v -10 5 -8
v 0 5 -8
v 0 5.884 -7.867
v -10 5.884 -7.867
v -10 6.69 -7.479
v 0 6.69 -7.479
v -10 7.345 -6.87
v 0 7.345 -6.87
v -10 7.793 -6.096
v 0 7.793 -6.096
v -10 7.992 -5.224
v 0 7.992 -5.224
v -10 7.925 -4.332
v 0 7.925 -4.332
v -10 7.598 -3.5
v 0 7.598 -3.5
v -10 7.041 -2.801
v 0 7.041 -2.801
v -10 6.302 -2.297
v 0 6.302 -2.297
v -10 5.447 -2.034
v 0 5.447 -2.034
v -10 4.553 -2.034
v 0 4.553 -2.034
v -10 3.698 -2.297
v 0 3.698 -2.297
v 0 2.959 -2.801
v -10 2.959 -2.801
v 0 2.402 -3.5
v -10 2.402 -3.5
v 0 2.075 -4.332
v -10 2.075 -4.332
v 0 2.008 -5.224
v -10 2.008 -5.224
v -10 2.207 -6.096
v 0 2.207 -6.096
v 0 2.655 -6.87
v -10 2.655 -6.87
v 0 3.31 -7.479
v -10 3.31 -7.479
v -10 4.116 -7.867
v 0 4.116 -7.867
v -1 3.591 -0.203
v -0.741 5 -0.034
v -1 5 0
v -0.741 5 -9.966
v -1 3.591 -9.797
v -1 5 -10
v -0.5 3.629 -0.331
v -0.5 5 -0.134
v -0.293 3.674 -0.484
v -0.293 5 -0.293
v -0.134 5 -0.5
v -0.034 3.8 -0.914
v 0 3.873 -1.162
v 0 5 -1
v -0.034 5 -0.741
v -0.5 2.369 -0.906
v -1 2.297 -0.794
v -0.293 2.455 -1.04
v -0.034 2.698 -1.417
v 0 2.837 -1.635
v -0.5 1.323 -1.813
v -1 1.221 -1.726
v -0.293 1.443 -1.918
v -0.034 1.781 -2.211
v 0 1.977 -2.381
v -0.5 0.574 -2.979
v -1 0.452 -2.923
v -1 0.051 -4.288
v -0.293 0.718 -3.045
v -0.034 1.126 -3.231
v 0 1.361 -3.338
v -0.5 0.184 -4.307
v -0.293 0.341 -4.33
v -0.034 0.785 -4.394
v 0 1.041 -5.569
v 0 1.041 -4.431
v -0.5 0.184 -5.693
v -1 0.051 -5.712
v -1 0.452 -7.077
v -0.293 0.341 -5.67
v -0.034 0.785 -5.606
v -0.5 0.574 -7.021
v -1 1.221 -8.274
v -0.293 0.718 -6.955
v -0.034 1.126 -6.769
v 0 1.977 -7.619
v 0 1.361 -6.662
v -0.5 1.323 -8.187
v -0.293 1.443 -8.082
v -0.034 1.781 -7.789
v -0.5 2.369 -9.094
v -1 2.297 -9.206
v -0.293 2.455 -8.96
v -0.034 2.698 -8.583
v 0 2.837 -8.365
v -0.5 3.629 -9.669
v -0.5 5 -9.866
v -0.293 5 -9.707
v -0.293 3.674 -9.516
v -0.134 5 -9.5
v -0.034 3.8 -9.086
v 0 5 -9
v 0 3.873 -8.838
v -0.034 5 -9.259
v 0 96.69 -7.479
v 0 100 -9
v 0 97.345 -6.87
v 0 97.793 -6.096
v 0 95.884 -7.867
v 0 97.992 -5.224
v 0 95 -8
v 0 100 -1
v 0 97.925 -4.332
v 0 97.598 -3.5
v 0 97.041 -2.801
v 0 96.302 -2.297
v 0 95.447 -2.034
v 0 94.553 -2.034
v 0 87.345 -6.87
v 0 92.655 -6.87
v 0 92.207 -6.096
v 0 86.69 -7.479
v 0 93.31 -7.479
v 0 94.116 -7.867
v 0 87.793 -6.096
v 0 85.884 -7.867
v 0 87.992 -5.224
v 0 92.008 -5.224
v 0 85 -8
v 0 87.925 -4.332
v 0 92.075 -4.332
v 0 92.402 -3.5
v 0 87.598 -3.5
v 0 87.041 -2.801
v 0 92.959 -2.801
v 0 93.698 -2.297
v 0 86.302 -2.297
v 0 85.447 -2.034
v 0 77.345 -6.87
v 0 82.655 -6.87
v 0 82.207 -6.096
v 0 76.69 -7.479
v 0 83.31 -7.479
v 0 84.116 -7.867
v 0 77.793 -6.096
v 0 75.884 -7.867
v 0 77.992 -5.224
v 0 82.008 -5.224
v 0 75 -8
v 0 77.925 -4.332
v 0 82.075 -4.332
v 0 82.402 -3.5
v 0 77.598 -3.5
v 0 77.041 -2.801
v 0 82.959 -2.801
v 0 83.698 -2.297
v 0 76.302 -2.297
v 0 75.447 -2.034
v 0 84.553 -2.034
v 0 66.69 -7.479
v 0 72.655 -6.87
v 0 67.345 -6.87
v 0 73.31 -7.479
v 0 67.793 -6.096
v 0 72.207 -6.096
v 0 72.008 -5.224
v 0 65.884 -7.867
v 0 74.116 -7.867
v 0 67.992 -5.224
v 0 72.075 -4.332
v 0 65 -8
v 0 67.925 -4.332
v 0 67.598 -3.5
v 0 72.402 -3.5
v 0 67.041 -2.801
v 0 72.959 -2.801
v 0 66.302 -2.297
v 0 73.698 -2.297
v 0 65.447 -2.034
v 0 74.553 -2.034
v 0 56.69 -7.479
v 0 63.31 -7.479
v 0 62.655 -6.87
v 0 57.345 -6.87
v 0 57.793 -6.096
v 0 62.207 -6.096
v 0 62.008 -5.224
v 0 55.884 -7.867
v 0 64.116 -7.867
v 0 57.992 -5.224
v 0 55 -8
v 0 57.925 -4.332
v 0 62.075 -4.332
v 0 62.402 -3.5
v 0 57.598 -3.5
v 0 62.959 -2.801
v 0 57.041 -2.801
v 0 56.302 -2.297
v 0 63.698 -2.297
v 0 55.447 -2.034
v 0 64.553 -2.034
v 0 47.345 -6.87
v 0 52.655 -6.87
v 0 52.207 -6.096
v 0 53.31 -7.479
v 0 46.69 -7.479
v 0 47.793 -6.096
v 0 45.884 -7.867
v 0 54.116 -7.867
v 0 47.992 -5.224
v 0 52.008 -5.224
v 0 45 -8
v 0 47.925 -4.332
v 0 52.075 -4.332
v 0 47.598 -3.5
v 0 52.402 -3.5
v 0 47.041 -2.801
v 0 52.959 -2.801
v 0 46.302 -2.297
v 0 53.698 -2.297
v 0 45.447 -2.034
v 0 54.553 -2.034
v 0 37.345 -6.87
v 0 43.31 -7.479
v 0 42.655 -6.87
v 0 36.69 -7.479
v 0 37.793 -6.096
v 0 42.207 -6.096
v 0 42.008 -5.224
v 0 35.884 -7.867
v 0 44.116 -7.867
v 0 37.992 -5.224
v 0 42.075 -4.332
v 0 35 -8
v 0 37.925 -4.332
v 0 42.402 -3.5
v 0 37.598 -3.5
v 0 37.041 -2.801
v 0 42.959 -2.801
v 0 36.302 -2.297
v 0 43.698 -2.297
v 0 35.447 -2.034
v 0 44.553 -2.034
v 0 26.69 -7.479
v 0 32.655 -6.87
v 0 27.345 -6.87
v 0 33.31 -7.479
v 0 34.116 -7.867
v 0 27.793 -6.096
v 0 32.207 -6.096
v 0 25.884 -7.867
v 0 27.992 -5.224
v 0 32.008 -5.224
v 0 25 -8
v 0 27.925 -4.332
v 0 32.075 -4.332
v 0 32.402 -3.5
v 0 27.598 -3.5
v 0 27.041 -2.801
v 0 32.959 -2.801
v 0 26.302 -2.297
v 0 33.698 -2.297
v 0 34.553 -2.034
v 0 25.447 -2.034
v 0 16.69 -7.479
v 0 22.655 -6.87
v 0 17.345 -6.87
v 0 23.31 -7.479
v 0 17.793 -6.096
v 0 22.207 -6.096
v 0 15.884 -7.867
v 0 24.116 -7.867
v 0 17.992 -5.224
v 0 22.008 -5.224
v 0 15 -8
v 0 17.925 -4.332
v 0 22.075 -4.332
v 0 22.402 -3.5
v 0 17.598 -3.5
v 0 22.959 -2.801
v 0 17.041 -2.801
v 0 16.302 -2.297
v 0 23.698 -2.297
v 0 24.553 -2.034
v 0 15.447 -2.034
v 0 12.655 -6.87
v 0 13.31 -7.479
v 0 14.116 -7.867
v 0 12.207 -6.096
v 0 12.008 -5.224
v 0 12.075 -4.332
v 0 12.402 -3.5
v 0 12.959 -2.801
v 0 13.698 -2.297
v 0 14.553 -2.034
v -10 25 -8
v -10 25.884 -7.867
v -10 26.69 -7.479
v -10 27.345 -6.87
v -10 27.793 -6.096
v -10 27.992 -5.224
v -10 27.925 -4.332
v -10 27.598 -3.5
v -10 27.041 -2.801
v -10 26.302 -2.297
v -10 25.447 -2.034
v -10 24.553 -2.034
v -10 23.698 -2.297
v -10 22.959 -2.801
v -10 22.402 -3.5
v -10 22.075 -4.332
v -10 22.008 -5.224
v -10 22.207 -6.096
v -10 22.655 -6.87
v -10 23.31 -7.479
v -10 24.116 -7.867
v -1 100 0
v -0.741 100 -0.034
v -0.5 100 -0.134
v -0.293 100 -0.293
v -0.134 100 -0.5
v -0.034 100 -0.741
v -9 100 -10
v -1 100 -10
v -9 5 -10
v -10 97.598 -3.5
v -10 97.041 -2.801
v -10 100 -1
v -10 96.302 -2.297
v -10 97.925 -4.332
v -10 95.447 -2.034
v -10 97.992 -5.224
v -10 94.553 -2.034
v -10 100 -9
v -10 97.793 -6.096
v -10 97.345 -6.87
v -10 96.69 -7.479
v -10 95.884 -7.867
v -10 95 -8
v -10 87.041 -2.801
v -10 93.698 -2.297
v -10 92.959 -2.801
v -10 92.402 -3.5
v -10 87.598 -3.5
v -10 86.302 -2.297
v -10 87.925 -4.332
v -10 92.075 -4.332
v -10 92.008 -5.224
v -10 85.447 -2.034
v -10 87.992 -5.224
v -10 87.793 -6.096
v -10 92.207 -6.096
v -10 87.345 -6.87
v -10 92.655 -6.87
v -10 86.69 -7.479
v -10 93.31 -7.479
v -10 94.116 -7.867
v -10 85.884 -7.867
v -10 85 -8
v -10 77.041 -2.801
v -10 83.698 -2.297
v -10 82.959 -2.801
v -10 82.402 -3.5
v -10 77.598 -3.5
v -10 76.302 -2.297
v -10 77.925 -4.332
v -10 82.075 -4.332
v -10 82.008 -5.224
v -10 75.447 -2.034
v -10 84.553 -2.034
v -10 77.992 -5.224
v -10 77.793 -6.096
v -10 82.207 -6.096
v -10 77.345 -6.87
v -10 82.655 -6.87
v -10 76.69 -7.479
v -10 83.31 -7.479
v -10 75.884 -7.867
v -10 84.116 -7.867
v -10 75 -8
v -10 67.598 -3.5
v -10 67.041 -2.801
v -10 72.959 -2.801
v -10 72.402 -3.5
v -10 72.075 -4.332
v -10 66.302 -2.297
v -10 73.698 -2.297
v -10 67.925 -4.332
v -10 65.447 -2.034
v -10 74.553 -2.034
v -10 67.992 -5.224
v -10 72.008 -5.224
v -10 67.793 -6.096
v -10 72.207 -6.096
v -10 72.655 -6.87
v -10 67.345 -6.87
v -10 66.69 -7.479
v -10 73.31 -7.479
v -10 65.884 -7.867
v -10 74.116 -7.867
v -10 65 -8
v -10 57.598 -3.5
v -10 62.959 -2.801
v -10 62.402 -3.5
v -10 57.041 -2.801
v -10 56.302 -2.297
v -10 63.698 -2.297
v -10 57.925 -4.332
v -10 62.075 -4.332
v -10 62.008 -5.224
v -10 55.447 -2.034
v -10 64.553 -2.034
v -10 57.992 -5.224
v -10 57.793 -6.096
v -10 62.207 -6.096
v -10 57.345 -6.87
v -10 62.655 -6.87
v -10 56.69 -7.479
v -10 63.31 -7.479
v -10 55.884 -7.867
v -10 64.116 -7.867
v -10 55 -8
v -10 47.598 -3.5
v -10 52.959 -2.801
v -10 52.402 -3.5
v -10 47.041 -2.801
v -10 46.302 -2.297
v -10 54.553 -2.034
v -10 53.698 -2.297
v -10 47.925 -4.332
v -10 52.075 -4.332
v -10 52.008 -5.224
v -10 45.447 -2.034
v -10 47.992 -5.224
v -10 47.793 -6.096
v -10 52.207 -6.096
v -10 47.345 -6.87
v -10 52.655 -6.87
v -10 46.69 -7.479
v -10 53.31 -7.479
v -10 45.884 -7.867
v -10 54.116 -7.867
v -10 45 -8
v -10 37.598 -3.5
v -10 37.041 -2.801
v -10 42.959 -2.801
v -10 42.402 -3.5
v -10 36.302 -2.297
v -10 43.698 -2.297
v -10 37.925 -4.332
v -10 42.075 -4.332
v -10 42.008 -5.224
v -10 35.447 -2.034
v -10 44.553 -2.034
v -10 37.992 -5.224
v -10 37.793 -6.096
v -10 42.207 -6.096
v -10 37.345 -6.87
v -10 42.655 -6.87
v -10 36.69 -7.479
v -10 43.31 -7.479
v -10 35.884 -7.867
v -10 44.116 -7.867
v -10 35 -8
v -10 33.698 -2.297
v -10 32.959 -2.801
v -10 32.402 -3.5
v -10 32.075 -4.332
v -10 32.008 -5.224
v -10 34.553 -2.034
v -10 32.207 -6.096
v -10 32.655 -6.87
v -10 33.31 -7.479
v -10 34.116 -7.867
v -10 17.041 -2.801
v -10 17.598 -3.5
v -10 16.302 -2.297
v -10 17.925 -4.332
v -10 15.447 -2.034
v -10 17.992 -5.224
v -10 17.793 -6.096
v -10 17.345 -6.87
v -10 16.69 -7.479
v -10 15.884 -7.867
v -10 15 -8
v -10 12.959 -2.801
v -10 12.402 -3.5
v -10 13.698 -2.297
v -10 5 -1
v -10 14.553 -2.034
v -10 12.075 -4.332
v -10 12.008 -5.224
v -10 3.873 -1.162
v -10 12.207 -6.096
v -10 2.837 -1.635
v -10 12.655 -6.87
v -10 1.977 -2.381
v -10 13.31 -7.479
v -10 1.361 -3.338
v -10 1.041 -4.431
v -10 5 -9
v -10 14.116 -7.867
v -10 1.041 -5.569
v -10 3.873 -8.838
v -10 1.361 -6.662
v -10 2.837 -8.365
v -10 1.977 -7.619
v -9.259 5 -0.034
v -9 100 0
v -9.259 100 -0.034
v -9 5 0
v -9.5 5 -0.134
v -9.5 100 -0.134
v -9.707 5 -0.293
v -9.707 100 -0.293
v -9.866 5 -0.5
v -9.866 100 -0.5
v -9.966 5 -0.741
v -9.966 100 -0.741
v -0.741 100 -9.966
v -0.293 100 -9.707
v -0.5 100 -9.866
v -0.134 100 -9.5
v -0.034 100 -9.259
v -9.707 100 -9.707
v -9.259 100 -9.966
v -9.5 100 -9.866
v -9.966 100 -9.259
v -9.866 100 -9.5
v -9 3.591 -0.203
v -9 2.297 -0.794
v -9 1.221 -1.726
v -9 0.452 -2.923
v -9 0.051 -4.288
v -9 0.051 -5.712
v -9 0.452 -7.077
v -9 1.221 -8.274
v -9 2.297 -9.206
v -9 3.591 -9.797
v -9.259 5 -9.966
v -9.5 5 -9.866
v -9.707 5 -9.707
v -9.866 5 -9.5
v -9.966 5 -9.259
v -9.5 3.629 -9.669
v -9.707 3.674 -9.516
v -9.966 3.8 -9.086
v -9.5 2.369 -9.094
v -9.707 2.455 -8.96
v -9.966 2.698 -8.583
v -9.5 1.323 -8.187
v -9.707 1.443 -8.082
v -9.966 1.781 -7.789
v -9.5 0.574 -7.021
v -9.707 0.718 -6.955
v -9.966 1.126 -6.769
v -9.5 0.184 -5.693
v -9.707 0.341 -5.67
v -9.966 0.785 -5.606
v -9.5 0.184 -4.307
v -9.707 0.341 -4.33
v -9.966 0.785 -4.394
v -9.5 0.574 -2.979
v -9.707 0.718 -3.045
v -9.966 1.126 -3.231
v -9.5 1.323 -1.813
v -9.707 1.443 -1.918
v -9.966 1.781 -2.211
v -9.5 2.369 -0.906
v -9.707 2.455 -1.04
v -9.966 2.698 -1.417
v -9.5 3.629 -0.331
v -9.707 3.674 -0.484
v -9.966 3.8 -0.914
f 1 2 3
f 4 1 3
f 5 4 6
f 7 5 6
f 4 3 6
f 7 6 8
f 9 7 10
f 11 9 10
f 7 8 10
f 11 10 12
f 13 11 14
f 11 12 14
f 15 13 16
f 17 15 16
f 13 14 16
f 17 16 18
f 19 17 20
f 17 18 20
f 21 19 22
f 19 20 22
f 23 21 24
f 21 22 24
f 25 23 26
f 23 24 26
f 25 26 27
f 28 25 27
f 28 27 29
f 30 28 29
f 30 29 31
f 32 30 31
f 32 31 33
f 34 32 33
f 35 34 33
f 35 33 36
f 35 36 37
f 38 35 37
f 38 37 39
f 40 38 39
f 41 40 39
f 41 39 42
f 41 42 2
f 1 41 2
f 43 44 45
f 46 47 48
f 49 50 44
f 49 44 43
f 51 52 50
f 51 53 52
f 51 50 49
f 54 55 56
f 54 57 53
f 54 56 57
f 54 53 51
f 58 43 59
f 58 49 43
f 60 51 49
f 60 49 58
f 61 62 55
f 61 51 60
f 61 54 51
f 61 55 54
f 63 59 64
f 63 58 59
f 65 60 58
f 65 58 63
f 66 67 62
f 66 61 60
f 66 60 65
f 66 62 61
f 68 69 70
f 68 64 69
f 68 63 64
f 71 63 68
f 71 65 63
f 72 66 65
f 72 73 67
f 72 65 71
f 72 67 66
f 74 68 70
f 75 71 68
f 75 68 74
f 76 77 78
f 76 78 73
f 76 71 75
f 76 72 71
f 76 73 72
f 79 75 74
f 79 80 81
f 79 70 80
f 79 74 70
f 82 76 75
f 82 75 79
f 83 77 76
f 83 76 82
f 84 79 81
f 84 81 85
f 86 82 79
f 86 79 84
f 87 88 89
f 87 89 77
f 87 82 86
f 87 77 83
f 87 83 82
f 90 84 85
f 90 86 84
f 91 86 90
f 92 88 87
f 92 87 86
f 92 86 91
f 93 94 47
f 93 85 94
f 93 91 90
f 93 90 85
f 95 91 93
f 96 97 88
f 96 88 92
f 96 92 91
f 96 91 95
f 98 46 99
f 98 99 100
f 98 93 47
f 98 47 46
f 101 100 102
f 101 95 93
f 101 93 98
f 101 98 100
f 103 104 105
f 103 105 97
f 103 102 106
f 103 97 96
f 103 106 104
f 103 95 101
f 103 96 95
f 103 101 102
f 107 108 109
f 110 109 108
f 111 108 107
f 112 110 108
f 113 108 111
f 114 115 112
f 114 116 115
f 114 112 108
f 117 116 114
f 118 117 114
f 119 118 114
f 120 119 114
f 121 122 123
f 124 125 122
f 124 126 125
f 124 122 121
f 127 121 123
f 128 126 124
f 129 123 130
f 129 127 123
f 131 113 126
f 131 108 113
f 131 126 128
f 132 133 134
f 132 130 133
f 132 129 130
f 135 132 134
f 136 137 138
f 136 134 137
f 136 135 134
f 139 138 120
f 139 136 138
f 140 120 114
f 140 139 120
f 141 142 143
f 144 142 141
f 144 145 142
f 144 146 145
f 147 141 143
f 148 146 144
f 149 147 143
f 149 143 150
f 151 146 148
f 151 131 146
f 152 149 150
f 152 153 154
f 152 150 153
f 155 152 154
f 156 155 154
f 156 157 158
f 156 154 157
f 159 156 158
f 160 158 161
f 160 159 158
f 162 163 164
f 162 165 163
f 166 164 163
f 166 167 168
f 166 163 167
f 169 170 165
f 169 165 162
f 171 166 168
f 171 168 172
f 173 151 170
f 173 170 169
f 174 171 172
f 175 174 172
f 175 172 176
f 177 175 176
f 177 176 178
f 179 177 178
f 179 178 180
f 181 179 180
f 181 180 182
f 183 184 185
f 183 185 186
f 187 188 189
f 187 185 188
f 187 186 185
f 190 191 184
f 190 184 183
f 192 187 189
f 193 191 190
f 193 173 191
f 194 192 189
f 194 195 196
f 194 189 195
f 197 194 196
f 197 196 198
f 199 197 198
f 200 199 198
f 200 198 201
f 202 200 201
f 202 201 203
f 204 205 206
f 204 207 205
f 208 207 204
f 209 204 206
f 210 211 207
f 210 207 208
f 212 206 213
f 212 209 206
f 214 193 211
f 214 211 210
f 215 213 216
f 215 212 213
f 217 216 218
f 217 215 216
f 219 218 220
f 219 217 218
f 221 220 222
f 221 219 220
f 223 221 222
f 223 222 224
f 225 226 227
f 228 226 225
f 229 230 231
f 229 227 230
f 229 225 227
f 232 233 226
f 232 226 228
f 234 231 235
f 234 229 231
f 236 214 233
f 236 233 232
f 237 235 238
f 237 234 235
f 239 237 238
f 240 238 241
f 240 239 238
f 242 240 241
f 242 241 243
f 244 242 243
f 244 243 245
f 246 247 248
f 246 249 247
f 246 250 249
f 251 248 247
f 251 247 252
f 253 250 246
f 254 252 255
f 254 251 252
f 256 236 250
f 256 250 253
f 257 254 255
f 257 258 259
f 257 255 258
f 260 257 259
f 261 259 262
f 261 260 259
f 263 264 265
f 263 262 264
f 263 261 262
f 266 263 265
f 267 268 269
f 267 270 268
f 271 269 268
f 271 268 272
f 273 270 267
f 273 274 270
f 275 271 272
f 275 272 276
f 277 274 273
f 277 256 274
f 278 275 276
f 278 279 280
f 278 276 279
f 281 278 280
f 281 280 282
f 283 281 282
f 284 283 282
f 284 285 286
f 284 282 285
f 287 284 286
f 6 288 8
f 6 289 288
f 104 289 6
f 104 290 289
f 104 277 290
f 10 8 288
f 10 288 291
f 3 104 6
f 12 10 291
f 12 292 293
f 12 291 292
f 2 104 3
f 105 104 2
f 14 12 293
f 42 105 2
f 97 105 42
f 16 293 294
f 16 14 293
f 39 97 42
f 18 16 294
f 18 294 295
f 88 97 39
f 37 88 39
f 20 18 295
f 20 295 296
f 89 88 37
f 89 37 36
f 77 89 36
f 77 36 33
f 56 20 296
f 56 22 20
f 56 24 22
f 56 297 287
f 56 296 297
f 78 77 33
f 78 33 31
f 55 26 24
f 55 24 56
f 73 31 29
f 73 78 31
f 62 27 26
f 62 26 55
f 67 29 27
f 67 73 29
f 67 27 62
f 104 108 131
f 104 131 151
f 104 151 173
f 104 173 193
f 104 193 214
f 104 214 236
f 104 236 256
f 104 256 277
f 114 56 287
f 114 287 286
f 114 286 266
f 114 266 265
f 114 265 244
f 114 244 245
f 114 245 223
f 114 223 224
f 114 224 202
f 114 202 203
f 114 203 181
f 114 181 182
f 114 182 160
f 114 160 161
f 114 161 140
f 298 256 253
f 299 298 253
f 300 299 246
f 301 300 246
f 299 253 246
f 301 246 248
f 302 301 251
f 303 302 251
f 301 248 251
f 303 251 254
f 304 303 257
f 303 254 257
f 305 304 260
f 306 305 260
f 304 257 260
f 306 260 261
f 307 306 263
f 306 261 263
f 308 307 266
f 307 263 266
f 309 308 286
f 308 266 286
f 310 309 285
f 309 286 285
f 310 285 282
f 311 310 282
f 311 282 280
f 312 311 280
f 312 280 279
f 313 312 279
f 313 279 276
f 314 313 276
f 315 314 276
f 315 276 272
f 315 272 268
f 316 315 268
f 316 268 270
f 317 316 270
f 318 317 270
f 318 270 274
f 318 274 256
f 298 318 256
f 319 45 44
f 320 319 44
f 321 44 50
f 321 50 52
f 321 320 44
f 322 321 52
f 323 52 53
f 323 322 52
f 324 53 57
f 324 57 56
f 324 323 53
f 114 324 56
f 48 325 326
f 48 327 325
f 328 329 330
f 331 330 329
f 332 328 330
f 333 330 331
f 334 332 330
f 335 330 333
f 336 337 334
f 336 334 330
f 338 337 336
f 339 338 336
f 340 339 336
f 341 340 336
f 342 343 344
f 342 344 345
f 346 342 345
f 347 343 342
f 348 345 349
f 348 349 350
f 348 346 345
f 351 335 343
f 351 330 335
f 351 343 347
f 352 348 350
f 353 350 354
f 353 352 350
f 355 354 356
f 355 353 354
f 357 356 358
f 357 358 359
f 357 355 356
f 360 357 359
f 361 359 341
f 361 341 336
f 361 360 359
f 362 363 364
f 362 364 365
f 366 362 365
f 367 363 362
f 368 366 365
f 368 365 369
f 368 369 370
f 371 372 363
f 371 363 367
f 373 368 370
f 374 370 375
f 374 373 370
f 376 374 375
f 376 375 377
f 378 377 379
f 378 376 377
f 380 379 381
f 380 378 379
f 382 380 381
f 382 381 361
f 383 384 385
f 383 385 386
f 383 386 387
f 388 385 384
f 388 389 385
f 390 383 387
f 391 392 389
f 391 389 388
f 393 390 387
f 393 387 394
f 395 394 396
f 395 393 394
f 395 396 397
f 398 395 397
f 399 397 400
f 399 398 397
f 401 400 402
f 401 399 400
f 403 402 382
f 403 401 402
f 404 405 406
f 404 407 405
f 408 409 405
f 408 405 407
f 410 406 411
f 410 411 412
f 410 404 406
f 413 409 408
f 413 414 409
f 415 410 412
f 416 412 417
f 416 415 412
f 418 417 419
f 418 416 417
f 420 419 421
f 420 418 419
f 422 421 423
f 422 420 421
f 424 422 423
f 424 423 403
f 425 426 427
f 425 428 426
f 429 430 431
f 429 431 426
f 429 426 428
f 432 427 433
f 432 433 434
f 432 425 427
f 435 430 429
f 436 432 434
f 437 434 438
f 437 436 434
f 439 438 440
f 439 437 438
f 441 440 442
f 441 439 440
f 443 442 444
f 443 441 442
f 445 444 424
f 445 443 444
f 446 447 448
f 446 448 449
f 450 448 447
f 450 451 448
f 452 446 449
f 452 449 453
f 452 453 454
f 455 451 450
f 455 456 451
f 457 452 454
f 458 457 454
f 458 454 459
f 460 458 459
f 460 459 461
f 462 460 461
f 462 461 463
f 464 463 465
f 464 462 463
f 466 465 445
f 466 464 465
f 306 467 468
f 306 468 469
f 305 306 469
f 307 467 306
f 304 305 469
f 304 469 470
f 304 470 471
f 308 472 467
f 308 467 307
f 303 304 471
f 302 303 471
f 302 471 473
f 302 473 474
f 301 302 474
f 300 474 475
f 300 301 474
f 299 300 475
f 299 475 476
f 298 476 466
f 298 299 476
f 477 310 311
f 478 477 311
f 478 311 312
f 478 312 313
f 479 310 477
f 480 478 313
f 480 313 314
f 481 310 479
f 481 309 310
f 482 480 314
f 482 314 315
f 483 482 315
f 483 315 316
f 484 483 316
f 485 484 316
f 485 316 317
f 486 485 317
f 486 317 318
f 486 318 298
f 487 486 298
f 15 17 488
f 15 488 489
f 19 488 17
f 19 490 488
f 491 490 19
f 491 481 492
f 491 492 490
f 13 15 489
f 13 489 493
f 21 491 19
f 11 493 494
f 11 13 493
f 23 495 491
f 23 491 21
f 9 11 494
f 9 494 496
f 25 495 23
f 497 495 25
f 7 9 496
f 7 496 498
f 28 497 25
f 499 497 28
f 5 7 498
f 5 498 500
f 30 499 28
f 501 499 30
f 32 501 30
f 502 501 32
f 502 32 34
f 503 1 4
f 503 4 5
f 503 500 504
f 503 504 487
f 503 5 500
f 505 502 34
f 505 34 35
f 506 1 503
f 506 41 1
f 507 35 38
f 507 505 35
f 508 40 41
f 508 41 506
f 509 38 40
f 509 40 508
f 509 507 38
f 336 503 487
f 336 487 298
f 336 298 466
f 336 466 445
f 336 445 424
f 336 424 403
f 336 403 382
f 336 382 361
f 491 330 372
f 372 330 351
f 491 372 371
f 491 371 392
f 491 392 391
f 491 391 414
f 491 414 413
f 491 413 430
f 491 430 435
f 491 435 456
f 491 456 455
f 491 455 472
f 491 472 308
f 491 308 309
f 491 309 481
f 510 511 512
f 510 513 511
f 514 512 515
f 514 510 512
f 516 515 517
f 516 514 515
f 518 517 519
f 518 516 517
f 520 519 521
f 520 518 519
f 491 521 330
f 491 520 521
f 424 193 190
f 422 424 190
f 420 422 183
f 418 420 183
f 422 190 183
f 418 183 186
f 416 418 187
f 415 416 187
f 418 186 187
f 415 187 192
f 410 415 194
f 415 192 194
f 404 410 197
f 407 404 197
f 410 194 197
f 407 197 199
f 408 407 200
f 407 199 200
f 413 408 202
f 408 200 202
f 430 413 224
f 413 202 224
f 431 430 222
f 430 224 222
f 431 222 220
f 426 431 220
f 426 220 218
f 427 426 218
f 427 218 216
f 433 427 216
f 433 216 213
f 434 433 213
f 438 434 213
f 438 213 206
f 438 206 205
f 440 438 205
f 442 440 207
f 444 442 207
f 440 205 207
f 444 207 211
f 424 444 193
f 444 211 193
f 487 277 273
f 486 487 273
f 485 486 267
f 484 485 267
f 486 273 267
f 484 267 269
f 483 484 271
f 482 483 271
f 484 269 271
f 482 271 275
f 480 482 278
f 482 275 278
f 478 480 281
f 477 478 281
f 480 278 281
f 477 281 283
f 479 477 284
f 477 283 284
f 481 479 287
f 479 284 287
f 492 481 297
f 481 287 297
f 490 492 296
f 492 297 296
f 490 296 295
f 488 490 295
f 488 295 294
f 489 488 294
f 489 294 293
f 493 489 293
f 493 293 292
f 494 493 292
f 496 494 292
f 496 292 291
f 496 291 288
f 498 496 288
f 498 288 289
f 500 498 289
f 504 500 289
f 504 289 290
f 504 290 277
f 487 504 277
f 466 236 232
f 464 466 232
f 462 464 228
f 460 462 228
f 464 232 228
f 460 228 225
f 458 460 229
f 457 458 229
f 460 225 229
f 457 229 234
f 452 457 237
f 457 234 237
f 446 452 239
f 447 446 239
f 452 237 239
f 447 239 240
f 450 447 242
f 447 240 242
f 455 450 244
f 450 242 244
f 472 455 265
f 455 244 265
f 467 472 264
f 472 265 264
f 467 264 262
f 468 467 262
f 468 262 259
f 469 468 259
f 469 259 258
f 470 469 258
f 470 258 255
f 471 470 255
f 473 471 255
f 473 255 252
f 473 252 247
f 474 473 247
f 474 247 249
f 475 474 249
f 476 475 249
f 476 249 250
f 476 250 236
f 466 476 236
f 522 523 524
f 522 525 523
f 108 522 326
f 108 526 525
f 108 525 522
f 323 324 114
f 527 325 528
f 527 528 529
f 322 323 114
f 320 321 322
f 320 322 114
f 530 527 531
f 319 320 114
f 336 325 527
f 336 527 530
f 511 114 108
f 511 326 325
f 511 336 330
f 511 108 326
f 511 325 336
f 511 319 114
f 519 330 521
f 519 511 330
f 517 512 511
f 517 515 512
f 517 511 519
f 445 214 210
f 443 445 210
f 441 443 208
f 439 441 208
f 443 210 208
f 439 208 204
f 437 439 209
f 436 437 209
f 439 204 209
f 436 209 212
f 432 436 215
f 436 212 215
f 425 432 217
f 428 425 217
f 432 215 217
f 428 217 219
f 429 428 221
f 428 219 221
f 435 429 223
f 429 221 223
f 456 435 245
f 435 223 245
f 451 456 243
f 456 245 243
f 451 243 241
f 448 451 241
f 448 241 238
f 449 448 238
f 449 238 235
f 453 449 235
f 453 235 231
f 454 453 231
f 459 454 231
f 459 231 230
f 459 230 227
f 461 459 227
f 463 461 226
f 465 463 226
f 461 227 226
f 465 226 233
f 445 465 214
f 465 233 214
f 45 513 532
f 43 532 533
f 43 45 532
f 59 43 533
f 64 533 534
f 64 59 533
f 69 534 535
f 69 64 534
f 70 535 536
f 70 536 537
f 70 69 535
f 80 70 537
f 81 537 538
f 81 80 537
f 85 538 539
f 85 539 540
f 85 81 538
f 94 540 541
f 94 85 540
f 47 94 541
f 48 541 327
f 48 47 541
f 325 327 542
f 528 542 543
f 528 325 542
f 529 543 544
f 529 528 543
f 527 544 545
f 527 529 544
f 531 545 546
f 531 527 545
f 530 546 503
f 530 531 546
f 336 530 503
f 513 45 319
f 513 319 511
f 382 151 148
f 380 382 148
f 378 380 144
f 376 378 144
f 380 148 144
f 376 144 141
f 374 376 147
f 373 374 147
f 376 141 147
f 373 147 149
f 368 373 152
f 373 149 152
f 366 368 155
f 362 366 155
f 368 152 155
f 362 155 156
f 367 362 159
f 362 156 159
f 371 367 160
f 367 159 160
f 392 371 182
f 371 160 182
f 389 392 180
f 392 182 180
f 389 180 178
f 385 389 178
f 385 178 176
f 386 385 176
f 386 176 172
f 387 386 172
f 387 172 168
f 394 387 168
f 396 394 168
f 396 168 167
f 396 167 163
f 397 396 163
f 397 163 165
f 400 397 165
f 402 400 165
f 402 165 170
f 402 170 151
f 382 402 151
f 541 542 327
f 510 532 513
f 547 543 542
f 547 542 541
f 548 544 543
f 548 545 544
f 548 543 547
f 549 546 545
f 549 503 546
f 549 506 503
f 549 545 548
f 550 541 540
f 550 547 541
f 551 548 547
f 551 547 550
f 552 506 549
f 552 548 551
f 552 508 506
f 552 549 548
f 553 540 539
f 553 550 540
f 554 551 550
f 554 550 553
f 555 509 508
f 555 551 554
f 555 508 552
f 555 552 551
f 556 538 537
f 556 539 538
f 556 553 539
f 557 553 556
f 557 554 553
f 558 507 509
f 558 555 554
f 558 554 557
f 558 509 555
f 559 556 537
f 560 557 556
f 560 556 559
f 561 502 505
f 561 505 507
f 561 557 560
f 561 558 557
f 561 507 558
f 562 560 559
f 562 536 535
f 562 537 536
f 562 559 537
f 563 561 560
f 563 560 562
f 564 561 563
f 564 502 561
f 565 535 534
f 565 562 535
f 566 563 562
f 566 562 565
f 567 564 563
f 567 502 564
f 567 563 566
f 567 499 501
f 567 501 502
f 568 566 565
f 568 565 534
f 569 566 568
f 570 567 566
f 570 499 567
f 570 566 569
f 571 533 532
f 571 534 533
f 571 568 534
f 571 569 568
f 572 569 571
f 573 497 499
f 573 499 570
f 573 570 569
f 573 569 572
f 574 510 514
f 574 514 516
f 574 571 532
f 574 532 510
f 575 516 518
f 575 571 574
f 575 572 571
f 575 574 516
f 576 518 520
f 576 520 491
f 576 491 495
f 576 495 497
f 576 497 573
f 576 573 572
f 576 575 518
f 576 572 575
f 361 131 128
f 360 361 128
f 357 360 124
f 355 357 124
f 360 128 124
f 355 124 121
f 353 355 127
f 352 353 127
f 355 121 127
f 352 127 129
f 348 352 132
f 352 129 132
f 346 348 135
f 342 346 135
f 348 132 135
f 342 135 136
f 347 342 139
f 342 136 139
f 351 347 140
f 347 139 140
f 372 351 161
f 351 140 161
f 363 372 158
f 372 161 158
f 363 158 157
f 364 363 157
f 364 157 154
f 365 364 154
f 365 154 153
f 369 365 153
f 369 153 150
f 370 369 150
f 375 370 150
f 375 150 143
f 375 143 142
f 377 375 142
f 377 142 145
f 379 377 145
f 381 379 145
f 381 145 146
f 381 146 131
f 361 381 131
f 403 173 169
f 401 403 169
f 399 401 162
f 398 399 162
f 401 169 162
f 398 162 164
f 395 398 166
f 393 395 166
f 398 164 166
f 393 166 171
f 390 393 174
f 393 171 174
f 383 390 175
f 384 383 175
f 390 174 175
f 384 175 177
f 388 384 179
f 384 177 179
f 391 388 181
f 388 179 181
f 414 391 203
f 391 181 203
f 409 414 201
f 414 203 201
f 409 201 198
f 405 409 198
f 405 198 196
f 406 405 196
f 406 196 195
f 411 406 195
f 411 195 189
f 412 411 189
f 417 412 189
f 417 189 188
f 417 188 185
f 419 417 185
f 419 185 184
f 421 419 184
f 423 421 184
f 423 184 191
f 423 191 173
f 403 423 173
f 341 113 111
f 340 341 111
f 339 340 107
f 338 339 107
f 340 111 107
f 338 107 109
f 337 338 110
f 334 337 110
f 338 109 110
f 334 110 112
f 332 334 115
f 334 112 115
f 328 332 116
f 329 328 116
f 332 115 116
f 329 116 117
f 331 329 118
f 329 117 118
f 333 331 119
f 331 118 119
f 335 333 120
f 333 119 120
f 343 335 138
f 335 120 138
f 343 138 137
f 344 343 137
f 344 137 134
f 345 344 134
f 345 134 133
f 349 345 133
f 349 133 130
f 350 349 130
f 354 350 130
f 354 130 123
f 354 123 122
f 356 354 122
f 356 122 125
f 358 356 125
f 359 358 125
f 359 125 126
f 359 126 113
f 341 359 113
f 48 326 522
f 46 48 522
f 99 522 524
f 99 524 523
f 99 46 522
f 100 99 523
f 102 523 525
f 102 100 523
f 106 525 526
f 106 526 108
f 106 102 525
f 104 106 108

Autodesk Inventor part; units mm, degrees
ref_plane "YZ Plane" through (0, 0, 0) normal (1, 0, 0) x (0, 1, 0)
ref_plane "XZ Plane" through (0, 0, 0) normal (0, 1, 0) x (-1, 0, 0)
ref_plane "XY Plane" through (0, 0, 0) normal (0, 0, 1) x (1, 0, 0)
sketch "Sketch1" plane through (0, 0, 0) normal (0, 1, 0) x (-1, 0, 0)
  line L0 (0, 0) -> (10, 0)
  line L1 (10, 0) -> (10, -10)
  line L2 (10, -10) -> (0, -10)
  line L3 (0, -10) -> (0, 0)
  dimension "d0" = 10
  dimension "d1" = 10
extrude "Extrusion1" add sketch "Sketch1" along normal blind 100
sketch "Sketch2" plane through (0, 0, 0) normal (1, 0, 0) x (0, 0, -1)
  circle A0 centre (5, 95) radius 3
  line L0 (10, 0) -> (10, 100) projected
  line L1 (0, 100) -> (10, 100) projected
  line L2 (0, 0) -> (10, 0) projected
  line L3 (10, 0) -> (10, 100) projected
  line L4 (0, 100) -> (10, 100) projected
  line L5 (0, 0) -> (0, 100) projected
  circle A1 centre (5, 85) radius 3
  circle A2 centre (5, 75) radius 3
  circle A3 centre (5, 65) radius 3
  circle A4 centre (5, 55) radius 3
  circle A5 centre (5, 45) radius 3
  circle A6 centre (5, 35) radius 3
  circle A7 centre (5, 25) radius 3
  circle A8 centre (5, 15) radius 3
  circle A9 centre (5, 5) radius 3
  line L6 (0, 0) -> (0, 100) projected
  line L7 (10, 0) -> (10, 100) projected
  arc A10 (0, 5) -> (10, 5) centre (5, 5) ccw
  line L8 (10, 0) -> (0, 0) projected
  point P0 (5, 0)
  point P1 (0, 5)
  point P2 (10, 5)
  dimension "d4" = 6
  dimension "d5" = 5
  dimension "d6" = 5
  dimension "d9" = 10
extrude "Extrusion2" cut sketch "Sketch2" against normal through all contours A0 | L2 A10 L0 | L2 L5 A10 | A1 | A2 | A3 | A4 | A5 | A6 | A7 | A8 | A9
fillet "Fillet1" radius 1 6 edges at (0, 0, -5) (0, 52.5, -10) (0, 52.5, 0) (-10, 0, -5) (-10, 52.5, -10) (-10, 52.5, 0)
properties part number "Stang3D"
